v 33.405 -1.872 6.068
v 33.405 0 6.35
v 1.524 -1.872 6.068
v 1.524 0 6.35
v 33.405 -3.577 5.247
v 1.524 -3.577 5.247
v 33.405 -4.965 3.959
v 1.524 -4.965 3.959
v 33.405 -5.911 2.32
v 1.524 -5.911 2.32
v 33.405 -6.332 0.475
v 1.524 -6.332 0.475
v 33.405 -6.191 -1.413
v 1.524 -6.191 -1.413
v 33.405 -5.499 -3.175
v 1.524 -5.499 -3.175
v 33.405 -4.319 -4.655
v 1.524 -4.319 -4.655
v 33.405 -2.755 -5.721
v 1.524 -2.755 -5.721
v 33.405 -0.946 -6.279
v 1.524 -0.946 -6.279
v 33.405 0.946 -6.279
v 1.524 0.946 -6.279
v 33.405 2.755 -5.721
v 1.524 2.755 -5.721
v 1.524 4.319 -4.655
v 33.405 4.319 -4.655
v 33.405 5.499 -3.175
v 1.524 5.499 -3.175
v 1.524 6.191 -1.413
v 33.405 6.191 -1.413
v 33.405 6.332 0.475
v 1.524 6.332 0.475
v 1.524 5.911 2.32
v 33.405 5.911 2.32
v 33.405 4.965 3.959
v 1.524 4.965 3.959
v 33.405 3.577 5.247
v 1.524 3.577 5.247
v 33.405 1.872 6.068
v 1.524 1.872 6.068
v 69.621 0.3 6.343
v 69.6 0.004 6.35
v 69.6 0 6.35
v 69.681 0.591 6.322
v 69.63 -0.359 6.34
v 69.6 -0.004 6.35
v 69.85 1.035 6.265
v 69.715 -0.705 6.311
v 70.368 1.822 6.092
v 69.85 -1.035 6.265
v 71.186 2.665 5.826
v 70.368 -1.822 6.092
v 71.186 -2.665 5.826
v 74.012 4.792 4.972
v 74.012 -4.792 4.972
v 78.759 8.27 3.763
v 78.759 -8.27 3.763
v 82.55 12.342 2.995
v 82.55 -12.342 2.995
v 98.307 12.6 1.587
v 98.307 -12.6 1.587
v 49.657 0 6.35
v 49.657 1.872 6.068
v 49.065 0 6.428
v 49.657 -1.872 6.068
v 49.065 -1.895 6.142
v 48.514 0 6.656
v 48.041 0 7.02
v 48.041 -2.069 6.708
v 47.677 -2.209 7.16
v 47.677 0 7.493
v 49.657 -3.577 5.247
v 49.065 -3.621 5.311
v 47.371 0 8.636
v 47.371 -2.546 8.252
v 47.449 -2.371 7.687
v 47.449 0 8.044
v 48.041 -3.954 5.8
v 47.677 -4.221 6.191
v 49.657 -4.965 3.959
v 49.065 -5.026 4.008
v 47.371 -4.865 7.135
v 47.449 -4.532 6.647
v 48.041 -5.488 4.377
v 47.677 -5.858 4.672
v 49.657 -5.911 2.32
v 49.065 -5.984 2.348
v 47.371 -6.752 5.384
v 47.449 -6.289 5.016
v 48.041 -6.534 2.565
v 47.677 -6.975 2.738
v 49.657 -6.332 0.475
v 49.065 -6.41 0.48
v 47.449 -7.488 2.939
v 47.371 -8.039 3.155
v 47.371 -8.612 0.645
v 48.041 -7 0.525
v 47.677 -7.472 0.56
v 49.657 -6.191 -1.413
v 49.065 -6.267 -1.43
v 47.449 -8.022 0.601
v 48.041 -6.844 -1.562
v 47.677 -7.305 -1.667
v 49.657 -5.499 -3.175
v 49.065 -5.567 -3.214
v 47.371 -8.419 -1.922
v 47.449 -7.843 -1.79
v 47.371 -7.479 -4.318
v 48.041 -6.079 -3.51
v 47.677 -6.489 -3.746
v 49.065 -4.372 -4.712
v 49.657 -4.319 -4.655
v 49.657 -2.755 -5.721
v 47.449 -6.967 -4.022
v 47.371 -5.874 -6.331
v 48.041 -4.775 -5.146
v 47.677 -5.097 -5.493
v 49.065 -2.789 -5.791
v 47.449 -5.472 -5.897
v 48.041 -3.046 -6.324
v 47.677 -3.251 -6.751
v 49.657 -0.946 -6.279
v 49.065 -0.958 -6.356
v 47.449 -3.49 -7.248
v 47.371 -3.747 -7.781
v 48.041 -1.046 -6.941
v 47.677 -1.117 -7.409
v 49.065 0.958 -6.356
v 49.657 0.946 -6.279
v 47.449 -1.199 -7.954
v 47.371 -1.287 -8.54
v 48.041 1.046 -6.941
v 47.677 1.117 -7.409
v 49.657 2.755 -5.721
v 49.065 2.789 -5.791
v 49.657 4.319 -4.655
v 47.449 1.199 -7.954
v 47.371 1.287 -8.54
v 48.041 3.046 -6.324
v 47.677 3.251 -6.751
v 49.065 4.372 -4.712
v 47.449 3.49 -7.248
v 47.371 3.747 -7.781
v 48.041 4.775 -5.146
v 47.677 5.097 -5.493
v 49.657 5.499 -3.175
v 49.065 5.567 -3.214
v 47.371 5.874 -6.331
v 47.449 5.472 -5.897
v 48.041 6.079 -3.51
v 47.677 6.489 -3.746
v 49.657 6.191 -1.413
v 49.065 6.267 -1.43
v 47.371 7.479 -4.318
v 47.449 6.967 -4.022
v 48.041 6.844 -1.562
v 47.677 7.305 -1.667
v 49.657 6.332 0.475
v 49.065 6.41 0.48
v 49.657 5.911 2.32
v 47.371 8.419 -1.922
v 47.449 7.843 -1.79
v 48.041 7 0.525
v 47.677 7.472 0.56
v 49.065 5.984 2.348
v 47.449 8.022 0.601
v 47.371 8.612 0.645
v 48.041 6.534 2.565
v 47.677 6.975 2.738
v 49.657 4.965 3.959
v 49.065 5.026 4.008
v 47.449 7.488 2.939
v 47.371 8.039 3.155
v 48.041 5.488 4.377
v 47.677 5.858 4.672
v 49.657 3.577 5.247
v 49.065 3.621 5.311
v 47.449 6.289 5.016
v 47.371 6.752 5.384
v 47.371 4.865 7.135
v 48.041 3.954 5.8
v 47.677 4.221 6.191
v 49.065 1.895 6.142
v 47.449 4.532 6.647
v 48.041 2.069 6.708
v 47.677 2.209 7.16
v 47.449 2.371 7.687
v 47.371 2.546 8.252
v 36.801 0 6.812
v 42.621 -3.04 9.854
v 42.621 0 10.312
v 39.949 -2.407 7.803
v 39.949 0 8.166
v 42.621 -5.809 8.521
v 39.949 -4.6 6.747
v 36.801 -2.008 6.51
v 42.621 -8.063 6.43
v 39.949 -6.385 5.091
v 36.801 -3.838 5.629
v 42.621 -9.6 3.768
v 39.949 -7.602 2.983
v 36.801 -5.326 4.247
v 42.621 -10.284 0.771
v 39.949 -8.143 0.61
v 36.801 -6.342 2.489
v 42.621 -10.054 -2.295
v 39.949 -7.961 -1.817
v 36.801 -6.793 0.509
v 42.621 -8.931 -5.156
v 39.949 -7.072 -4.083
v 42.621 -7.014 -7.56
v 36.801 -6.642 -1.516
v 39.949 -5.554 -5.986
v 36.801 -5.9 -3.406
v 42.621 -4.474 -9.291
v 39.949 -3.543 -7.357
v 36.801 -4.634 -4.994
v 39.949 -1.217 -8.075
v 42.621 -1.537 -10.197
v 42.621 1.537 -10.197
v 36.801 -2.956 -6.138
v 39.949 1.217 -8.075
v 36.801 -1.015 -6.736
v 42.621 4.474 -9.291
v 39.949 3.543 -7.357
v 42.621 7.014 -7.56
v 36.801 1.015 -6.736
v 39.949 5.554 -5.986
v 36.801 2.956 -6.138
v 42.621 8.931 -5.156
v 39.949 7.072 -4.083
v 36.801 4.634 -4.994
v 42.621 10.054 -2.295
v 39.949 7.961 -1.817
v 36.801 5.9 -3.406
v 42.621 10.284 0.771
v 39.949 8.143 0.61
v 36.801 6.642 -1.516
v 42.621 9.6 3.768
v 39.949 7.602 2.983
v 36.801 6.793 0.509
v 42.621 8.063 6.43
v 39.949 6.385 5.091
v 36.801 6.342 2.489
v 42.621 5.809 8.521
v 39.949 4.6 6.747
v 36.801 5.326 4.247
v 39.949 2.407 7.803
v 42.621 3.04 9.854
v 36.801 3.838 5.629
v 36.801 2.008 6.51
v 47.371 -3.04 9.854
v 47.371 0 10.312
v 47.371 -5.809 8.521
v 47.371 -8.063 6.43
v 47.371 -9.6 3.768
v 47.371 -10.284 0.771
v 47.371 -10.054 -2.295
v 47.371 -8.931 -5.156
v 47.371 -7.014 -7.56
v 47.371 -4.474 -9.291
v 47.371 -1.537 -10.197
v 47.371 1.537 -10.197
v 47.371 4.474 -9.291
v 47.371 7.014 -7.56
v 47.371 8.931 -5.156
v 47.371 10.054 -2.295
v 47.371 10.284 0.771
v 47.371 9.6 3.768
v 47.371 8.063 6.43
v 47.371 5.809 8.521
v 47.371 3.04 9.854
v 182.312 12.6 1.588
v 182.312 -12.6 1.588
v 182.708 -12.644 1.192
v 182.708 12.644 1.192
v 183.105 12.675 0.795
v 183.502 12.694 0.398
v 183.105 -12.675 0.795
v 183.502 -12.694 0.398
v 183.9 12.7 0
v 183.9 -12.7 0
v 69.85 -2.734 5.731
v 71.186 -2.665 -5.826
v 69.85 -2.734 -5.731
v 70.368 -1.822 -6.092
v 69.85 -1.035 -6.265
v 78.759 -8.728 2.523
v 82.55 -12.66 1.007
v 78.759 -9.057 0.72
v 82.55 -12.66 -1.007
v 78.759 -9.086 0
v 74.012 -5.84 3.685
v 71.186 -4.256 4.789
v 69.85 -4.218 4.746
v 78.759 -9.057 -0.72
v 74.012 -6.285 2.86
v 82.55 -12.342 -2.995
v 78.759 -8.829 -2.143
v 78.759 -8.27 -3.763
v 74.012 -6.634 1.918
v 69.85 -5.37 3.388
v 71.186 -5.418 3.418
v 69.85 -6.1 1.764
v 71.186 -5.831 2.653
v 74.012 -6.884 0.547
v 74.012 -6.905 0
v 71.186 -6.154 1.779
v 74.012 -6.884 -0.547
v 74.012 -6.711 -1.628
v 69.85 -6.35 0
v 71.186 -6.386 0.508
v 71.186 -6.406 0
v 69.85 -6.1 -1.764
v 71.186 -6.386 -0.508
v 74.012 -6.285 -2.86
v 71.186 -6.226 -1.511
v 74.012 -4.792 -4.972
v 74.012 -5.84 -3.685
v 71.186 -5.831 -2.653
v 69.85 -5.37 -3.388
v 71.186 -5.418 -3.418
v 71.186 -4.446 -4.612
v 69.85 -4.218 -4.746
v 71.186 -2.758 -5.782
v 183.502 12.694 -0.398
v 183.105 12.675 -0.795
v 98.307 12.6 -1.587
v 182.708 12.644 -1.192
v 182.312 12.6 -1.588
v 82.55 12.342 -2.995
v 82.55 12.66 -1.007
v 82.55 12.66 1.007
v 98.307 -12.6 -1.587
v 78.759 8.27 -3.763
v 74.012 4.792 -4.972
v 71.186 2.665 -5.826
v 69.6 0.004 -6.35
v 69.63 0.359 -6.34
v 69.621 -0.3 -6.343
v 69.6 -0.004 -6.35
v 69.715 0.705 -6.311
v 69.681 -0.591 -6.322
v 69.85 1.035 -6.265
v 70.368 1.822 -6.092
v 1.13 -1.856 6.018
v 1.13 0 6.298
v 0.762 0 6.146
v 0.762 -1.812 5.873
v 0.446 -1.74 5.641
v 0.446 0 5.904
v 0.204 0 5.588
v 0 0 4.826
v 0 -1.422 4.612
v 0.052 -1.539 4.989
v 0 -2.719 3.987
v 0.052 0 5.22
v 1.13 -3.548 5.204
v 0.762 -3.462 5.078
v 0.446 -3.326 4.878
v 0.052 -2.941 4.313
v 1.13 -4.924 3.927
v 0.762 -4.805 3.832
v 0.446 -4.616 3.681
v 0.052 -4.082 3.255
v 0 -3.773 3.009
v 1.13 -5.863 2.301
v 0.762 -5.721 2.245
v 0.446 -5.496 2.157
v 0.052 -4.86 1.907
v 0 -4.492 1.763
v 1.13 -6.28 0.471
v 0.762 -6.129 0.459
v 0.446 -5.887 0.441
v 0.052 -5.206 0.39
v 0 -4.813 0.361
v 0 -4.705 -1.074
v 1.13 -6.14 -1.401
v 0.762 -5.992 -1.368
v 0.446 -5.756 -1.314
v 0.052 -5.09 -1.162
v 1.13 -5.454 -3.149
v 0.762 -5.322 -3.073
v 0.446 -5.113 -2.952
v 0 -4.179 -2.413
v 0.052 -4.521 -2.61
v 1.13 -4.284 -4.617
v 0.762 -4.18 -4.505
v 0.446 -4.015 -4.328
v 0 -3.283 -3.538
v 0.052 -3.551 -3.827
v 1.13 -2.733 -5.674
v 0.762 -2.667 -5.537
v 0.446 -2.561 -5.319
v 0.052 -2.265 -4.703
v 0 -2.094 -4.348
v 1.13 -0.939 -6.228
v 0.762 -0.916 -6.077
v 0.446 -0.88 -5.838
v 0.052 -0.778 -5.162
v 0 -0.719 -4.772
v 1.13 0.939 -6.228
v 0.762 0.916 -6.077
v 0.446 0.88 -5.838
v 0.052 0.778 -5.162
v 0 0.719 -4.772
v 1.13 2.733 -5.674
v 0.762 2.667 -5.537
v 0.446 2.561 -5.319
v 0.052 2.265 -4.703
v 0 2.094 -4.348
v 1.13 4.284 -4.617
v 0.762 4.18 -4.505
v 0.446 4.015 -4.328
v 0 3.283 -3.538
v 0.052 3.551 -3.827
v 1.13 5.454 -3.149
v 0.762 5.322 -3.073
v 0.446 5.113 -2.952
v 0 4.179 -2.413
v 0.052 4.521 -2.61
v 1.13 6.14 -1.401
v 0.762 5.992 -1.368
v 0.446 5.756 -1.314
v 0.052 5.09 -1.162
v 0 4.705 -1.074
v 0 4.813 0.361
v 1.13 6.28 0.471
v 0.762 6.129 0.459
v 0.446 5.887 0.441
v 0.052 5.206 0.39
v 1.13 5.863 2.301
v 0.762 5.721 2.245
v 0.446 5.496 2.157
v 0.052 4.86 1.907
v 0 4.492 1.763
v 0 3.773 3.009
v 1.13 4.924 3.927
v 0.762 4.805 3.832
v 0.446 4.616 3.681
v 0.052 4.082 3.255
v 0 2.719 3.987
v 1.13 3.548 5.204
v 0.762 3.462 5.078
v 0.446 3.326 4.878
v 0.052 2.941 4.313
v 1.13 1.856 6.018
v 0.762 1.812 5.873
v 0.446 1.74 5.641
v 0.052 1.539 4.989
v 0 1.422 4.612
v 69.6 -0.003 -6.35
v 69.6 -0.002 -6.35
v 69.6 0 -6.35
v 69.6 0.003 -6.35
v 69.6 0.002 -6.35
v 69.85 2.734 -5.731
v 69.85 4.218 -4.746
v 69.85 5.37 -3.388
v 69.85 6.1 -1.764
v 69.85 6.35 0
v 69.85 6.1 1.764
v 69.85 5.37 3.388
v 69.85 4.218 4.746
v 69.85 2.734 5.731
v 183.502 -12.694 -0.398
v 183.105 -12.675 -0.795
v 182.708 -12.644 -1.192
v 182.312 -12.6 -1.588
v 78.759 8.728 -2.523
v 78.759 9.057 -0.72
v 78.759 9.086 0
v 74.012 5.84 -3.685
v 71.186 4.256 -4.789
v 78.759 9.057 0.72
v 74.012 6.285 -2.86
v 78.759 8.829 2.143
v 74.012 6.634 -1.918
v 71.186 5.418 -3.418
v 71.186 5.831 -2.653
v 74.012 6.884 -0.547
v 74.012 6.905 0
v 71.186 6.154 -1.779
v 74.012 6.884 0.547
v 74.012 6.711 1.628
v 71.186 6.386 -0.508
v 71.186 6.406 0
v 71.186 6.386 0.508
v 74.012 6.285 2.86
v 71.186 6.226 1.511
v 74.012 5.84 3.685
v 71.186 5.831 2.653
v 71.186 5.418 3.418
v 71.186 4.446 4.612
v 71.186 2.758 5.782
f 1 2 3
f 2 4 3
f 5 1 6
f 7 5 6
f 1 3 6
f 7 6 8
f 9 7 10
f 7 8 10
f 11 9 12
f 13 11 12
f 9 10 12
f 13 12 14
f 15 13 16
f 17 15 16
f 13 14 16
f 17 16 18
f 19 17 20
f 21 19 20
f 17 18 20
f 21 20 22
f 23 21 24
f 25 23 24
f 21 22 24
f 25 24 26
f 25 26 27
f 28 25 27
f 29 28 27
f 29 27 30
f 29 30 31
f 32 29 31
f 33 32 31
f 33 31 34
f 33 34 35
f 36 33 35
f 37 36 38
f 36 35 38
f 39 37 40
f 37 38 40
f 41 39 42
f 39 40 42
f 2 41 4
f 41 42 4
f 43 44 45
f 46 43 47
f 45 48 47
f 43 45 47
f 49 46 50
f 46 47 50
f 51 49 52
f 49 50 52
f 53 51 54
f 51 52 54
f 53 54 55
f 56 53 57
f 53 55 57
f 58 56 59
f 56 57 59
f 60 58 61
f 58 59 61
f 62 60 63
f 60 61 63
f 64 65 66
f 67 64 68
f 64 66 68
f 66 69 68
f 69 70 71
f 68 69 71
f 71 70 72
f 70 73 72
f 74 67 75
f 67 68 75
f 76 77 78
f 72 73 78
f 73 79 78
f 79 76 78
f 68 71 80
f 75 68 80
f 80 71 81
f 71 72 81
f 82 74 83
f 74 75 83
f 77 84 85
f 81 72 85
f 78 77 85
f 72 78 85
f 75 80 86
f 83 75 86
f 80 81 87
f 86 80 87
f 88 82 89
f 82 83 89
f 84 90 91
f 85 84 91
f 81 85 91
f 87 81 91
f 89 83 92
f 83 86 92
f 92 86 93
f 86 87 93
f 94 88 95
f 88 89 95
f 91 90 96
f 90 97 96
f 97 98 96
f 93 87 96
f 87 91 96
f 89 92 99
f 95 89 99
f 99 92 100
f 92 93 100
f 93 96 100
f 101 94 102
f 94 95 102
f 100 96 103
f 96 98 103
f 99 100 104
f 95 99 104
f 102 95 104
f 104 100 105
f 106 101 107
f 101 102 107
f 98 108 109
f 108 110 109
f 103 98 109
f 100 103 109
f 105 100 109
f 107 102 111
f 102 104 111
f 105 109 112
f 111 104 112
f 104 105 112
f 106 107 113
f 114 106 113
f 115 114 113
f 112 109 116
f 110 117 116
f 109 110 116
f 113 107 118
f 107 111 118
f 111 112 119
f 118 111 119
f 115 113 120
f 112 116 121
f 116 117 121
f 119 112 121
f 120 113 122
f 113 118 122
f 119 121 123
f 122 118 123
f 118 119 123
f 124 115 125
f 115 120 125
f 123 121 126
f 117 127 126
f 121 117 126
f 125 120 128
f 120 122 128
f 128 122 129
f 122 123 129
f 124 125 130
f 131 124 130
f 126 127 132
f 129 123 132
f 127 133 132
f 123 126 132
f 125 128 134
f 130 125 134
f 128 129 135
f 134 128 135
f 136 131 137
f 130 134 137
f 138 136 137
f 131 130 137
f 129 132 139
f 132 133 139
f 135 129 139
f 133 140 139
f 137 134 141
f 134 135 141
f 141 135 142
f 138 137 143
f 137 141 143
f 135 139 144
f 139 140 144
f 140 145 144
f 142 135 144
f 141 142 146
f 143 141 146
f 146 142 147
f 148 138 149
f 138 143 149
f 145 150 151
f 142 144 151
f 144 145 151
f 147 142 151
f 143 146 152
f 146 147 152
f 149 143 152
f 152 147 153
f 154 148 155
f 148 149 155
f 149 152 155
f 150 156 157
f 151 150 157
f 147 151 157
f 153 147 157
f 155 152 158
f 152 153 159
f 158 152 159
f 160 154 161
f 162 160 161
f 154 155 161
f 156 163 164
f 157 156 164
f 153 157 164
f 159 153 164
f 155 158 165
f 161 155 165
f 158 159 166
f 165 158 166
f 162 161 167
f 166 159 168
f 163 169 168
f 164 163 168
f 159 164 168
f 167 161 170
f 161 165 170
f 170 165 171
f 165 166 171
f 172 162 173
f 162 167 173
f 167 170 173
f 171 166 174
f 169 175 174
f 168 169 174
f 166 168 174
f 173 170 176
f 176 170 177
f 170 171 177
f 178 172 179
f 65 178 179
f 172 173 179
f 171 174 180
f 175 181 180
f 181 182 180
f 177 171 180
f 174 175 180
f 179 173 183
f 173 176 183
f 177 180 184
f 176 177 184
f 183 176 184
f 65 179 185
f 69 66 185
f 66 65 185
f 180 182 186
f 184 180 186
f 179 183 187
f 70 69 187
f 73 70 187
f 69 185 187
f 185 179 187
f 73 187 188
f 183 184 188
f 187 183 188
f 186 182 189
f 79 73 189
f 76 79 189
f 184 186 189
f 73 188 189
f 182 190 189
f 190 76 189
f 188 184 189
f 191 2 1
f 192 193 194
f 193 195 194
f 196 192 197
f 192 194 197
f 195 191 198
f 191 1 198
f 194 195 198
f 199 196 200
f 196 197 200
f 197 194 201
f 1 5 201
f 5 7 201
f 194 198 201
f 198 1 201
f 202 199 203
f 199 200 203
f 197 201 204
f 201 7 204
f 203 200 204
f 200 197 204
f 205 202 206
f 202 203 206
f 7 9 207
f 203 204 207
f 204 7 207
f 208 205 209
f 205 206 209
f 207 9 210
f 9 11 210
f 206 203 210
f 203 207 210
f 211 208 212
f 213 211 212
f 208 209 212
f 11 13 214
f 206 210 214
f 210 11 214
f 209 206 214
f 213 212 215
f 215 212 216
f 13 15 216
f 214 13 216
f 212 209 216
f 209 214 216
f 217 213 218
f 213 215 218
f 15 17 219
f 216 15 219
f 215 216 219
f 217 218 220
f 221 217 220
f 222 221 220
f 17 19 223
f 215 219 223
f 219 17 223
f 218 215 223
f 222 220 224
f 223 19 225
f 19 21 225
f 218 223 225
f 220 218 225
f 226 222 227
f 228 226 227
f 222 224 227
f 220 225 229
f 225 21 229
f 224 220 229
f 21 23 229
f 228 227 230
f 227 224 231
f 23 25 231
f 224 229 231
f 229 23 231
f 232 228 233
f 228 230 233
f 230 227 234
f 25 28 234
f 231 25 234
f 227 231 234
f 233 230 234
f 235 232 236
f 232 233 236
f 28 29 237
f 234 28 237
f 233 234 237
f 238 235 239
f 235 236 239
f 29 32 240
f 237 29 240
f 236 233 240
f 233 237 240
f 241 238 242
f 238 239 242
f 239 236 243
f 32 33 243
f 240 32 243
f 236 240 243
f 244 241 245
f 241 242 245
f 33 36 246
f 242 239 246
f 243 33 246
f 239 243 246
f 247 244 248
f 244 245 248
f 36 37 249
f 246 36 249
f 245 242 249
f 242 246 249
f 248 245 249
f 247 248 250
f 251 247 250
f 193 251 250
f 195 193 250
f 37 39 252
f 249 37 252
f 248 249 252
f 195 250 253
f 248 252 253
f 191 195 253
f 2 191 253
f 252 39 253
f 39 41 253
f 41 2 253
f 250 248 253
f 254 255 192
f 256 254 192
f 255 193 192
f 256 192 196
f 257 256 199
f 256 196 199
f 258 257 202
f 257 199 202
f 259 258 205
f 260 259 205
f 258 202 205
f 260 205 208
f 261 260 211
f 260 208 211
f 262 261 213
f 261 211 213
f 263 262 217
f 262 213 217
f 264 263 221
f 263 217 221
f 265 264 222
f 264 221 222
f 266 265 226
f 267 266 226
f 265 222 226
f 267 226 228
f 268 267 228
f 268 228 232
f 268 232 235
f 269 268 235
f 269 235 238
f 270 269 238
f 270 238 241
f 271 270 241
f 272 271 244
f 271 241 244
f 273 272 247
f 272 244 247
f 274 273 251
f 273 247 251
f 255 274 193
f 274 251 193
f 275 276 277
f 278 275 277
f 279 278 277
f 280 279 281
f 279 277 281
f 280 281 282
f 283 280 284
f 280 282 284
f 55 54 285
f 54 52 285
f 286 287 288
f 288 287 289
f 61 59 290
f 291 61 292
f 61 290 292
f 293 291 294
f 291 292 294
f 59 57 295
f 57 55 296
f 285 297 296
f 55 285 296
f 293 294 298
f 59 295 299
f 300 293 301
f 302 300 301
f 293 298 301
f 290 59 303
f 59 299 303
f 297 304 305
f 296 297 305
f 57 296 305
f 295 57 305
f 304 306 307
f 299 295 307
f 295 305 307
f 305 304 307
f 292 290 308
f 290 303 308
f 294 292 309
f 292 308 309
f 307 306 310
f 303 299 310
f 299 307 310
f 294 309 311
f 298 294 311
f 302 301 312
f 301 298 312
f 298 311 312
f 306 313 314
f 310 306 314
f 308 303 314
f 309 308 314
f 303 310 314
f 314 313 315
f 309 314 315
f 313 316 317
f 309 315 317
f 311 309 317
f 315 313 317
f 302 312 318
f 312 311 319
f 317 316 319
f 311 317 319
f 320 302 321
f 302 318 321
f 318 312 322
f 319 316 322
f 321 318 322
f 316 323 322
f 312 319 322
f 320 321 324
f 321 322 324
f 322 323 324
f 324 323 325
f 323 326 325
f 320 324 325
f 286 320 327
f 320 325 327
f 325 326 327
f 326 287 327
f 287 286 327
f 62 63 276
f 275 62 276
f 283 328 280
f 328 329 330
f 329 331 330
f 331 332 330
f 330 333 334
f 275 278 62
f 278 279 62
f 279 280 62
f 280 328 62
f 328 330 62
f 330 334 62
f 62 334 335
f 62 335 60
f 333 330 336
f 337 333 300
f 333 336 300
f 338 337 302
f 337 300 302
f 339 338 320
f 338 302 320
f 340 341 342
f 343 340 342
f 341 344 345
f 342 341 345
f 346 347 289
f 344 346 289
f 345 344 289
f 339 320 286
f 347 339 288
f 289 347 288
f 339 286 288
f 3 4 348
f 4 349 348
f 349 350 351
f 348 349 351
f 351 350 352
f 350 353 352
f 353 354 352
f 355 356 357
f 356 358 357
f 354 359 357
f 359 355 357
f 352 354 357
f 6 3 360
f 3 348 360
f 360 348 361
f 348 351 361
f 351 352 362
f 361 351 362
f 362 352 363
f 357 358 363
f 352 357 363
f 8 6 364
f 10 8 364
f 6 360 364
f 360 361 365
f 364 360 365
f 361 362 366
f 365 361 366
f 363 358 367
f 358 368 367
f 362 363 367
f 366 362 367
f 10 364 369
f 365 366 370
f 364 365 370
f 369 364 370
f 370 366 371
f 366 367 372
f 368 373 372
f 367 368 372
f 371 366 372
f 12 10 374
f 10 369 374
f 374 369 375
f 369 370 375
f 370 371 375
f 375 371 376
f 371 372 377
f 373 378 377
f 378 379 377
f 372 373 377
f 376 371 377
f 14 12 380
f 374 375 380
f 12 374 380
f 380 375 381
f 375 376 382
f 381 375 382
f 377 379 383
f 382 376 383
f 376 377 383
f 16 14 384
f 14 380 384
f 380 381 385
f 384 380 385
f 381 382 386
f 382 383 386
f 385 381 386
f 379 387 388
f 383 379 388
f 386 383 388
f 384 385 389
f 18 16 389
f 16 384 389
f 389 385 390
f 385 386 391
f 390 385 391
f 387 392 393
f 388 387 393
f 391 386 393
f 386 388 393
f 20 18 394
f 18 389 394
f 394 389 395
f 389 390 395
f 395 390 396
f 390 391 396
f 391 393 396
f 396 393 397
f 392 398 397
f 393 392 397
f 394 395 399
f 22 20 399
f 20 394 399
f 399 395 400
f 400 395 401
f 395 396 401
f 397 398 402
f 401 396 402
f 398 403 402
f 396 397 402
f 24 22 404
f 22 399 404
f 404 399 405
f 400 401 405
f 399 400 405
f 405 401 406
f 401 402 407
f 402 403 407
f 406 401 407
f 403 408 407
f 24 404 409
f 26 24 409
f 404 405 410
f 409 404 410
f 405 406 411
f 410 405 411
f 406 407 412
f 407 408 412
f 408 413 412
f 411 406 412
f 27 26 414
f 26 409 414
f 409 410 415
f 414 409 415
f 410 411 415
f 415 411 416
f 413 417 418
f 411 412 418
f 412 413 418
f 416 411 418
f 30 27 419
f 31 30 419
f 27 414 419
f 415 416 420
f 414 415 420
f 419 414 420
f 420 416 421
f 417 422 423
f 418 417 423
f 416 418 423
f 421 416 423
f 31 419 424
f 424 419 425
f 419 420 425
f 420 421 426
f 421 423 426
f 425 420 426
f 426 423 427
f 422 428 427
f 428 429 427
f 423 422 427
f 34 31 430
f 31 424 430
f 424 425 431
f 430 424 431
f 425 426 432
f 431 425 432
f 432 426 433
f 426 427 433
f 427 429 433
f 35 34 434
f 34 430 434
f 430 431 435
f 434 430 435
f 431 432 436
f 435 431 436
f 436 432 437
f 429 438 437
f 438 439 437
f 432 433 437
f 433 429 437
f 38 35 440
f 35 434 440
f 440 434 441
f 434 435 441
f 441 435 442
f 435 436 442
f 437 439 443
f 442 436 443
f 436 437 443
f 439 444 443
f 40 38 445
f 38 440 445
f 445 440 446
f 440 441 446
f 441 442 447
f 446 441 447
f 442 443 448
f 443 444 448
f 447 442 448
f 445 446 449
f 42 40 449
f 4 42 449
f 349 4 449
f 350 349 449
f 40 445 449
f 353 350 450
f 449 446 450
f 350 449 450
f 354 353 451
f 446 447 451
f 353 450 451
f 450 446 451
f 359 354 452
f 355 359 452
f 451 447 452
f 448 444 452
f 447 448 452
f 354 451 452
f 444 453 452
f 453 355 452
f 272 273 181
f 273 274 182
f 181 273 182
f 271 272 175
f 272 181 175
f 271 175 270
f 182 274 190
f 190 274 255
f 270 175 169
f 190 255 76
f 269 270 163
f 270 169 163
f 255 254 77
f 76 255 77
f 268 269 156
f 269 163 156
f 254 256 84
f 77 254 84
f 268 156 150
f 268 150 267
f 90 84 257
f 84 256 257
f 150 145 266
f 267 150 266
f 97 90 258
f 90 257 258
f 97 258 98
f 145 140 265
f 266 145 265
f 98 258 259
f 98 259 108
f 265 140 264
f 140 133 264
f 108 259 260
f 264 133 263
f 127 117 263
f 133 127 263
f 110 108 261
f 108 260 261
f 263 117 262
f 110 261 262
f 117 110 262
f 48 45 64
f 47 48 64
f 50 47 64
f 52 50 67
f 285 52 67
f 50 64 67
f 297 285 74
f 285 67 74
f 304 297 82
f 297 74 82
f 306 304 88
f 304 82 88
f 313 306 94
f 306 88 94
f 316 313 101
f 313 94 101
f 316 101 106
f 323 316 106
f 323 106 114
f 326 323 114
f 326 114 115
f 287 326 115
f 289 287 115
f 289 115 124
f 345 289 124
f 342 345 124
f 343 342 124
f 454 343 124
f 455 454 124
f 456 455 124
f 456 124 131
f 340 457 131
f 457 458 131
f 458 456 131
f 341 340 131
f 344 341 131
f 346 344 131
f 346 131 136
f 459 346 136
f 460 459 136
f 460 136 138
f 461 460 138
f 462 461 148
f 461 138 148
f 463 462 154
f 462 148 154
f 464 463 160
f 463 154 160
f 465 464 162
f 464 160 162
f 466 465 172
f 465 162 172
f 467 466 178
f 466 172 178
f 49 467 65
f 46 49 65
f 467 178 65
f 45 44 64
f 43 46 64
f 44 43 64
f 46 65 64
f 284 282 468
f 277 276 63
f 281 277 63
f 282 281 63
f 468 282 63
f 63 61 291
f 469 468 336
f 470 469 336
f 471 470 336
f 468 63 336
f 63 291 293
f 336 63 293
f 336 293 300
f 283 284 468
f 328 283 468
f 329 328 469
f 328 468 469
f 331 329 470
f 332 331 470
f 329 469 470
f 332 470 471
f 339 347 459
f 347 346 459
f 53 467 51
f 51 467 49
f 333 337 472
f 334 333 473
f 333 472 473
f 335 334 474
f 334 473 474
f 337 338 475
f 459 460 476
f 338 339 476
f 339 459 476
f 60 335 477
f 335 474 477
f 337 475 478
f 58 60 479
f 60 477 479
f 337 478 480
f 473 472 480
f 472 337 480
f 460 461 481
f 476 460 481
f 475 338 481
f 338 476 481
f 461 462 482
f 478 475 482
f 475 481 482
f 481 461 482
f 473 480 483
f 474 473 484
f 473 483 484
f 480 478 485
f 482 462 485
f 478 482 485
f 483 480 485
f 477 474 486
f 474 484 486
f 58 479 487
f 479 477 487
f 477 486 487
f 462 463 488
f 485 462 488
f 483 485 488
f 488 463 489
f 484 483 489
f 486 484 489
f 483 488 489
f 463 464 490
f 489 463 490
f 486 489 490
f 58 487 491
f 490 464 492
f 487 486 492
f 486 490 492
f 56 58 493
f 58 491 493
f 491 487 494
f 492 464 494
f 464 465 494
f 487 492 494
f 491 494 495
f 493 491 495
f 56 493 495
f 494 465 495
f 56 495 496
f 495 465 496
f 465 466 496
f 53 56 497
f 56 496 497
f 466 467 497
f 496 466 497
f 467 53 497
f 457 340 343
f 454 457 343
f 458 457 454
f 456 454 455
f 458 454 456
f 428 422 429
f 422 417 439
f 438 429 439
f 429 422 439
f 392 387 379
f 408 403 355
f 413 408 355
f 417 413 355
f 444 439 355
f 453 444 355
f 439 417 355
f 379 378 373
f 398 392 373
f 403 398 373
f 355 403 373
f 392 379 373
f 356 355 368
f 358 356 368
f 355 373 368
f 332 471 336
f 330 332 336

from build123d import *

# Parameters (mm, degrees)
F3_DEPTH = 25.4
F4_DEPTH = 25.4


# Not quite as in the source:
# - ends of sketch curves that miss each other by under 0.0002 mm in the source are joined


with BuildPart() as f1:
    # F0 (on Front) → F1 (revolve)
    with BuildSketch(Plane.XZ):
        with BuildLine():
            Line((0, 4.826), (0, 0))
            Line((0, 0), (184.15, 0))
            Line((184.15, 0), (184.15, 12.7))
            Line((184.15, 12.7), (82.55, 12.7))
            ThreePointArc((82.55, 12.7), (76.9495160289, 8.0259690987), (69.8500007868, 6.350001049))
            Line((69.8500007868, 6.350001049), (49.657, 6.35))
            ThreePointArc((49.657, 6.35), (48.0405538982, 7.0195538982), (47.371, 8.636))
            Line((47.371, 8.636), (47.371, 10.3124))
            Line((47.371, 10.3124), (42.6212, 10.3124))
            ThreePointArc((42.6212, 10.3124), (38.420772371, 7.3825769769), (33.4046742858, 6.35))
            Line((33.4046742858, 6.35), (1.524, 6.35))
            ThreePointArc((1.524, 6.35), (0.4463692655, 5.9036307345), (0, 4.826))
        make_face()
    revolve(axis=Axis((92.075, 0, 0), (1, 0, 0)))

    # F2 (on Front) → F3 (cut)
    with BuildSketch(Plane.XZ):
        with BuildLine():
            Line((189.3032044172, 0), (183.8999837637, 0))
            Line((183.8999837637, 0), (182.3124837637, -1.5875))
            Line((182.3124837637, -1.5875), (98.3069729219, -1.5875))
            ThreePointArc((98.3069729219, -1.5875), (83.7572950904, -2.7862065375), (69.5999860764, -6.35))
            Line((69.5999860764, -6.35), (82.516618073, -56.9406822324))
            Line((82.516618073, -56.9406822324), (124.9158531427, -44.9918061495))
            Line((124.9158531427, -44.9918061495), (189.3032044172, -23.9094942808))
            Line((189.3032044172, -23.9094942808), (189.3032044172, 0))
        make_face()
        with BuildLine():
            Line((182.3124837637, 1.5875), (183.8999837637, 0))
            Line((183.8999837637, 0), (189.3032044172, 0))
            Line((189.3032044172, 0), (189.3032044172, 23.9094942808))
            Line((189.3032044172, 23.9094942808), (183.8999837637, 25.6786675836))
            Line((183.8999837637, 25.6786675836), (124.9158531427, 44.9918061495))
            Line((124.9158531427, 44.9918061495), (82.516618073, 56.9406822324))
            Line((82.516618073, 56.9406822324), (69.5999860764, 6.35))
            ThreePointArc((69.5999860764, 6.35), (83.7572950904, 2.7862065375), (98.3069729219, 1.5875))
            Line((98.3069729219, 1.5875), (182.3124837637, 1.5875))
        make_face()
    extrude(amount=-F3_DEPTH, mode=Mode.SUBTRACT)

    # F2 (on Front) → F4 (cut)
    with BuildSketch(Plane.XZ):
        with BuildLine():
            Line((182.3124837637, 1.5875), (183.8999837637, 0))
            Line((183.8999837637, 0), (189.3032044172, 0))
            Line((189.3032044172, 0), (189.3032044172, 23.9094942808))
            Line((189.3032044172, 23.9094942808), (183.8999837637, 25.6786675836))
            Line((183.8999837637, 25.6786675836), (124.9158531427, 44.9918061495))
            Line((124.9158531427, 44.9918061495), (82.516618073, 56.9406822324))
            Line((82.516618073, 56.9406822324), (69.5999860764, 6.35))
            ThreePointArc((69.5999860764, 6.35), (83.7572950904, 2.7862065375), (98.3069729219, 1.5875))
            Line((98.3069729219, 1.5875), (182.3124837637, 1.5875))
        make_face()
        with BuildLine():
            Line((189.3032044172, 0), (183.8999837637, 0))
            Line((183.8999837637, 0), (182.3124837637, -1.5875))
            Line((182.3124837637, -1.5875), (98.3069729219, -1.5875))
            ThreePointArc((98.3069729219, -1.5875), (83.7572950904, -2.7862065375), (69.5999860764, -6.35))
            Line((69.5999860764, -6.35), (82.516618073, -56.9406822324))
            Line((82.516618073, -56.9406822324), (124.9158531427, -44.9918061495))
            Line((124.9158531427, -44.9918061495), (189.3032044172, -23.9094942808))
            Line((189.3032044172, -23.9094942808), (189.3032044172, 0))
        make_face()
    extrude(amount=F4_DEPTH, mode=Mode.SUBTRACT)


solid = f1.part
